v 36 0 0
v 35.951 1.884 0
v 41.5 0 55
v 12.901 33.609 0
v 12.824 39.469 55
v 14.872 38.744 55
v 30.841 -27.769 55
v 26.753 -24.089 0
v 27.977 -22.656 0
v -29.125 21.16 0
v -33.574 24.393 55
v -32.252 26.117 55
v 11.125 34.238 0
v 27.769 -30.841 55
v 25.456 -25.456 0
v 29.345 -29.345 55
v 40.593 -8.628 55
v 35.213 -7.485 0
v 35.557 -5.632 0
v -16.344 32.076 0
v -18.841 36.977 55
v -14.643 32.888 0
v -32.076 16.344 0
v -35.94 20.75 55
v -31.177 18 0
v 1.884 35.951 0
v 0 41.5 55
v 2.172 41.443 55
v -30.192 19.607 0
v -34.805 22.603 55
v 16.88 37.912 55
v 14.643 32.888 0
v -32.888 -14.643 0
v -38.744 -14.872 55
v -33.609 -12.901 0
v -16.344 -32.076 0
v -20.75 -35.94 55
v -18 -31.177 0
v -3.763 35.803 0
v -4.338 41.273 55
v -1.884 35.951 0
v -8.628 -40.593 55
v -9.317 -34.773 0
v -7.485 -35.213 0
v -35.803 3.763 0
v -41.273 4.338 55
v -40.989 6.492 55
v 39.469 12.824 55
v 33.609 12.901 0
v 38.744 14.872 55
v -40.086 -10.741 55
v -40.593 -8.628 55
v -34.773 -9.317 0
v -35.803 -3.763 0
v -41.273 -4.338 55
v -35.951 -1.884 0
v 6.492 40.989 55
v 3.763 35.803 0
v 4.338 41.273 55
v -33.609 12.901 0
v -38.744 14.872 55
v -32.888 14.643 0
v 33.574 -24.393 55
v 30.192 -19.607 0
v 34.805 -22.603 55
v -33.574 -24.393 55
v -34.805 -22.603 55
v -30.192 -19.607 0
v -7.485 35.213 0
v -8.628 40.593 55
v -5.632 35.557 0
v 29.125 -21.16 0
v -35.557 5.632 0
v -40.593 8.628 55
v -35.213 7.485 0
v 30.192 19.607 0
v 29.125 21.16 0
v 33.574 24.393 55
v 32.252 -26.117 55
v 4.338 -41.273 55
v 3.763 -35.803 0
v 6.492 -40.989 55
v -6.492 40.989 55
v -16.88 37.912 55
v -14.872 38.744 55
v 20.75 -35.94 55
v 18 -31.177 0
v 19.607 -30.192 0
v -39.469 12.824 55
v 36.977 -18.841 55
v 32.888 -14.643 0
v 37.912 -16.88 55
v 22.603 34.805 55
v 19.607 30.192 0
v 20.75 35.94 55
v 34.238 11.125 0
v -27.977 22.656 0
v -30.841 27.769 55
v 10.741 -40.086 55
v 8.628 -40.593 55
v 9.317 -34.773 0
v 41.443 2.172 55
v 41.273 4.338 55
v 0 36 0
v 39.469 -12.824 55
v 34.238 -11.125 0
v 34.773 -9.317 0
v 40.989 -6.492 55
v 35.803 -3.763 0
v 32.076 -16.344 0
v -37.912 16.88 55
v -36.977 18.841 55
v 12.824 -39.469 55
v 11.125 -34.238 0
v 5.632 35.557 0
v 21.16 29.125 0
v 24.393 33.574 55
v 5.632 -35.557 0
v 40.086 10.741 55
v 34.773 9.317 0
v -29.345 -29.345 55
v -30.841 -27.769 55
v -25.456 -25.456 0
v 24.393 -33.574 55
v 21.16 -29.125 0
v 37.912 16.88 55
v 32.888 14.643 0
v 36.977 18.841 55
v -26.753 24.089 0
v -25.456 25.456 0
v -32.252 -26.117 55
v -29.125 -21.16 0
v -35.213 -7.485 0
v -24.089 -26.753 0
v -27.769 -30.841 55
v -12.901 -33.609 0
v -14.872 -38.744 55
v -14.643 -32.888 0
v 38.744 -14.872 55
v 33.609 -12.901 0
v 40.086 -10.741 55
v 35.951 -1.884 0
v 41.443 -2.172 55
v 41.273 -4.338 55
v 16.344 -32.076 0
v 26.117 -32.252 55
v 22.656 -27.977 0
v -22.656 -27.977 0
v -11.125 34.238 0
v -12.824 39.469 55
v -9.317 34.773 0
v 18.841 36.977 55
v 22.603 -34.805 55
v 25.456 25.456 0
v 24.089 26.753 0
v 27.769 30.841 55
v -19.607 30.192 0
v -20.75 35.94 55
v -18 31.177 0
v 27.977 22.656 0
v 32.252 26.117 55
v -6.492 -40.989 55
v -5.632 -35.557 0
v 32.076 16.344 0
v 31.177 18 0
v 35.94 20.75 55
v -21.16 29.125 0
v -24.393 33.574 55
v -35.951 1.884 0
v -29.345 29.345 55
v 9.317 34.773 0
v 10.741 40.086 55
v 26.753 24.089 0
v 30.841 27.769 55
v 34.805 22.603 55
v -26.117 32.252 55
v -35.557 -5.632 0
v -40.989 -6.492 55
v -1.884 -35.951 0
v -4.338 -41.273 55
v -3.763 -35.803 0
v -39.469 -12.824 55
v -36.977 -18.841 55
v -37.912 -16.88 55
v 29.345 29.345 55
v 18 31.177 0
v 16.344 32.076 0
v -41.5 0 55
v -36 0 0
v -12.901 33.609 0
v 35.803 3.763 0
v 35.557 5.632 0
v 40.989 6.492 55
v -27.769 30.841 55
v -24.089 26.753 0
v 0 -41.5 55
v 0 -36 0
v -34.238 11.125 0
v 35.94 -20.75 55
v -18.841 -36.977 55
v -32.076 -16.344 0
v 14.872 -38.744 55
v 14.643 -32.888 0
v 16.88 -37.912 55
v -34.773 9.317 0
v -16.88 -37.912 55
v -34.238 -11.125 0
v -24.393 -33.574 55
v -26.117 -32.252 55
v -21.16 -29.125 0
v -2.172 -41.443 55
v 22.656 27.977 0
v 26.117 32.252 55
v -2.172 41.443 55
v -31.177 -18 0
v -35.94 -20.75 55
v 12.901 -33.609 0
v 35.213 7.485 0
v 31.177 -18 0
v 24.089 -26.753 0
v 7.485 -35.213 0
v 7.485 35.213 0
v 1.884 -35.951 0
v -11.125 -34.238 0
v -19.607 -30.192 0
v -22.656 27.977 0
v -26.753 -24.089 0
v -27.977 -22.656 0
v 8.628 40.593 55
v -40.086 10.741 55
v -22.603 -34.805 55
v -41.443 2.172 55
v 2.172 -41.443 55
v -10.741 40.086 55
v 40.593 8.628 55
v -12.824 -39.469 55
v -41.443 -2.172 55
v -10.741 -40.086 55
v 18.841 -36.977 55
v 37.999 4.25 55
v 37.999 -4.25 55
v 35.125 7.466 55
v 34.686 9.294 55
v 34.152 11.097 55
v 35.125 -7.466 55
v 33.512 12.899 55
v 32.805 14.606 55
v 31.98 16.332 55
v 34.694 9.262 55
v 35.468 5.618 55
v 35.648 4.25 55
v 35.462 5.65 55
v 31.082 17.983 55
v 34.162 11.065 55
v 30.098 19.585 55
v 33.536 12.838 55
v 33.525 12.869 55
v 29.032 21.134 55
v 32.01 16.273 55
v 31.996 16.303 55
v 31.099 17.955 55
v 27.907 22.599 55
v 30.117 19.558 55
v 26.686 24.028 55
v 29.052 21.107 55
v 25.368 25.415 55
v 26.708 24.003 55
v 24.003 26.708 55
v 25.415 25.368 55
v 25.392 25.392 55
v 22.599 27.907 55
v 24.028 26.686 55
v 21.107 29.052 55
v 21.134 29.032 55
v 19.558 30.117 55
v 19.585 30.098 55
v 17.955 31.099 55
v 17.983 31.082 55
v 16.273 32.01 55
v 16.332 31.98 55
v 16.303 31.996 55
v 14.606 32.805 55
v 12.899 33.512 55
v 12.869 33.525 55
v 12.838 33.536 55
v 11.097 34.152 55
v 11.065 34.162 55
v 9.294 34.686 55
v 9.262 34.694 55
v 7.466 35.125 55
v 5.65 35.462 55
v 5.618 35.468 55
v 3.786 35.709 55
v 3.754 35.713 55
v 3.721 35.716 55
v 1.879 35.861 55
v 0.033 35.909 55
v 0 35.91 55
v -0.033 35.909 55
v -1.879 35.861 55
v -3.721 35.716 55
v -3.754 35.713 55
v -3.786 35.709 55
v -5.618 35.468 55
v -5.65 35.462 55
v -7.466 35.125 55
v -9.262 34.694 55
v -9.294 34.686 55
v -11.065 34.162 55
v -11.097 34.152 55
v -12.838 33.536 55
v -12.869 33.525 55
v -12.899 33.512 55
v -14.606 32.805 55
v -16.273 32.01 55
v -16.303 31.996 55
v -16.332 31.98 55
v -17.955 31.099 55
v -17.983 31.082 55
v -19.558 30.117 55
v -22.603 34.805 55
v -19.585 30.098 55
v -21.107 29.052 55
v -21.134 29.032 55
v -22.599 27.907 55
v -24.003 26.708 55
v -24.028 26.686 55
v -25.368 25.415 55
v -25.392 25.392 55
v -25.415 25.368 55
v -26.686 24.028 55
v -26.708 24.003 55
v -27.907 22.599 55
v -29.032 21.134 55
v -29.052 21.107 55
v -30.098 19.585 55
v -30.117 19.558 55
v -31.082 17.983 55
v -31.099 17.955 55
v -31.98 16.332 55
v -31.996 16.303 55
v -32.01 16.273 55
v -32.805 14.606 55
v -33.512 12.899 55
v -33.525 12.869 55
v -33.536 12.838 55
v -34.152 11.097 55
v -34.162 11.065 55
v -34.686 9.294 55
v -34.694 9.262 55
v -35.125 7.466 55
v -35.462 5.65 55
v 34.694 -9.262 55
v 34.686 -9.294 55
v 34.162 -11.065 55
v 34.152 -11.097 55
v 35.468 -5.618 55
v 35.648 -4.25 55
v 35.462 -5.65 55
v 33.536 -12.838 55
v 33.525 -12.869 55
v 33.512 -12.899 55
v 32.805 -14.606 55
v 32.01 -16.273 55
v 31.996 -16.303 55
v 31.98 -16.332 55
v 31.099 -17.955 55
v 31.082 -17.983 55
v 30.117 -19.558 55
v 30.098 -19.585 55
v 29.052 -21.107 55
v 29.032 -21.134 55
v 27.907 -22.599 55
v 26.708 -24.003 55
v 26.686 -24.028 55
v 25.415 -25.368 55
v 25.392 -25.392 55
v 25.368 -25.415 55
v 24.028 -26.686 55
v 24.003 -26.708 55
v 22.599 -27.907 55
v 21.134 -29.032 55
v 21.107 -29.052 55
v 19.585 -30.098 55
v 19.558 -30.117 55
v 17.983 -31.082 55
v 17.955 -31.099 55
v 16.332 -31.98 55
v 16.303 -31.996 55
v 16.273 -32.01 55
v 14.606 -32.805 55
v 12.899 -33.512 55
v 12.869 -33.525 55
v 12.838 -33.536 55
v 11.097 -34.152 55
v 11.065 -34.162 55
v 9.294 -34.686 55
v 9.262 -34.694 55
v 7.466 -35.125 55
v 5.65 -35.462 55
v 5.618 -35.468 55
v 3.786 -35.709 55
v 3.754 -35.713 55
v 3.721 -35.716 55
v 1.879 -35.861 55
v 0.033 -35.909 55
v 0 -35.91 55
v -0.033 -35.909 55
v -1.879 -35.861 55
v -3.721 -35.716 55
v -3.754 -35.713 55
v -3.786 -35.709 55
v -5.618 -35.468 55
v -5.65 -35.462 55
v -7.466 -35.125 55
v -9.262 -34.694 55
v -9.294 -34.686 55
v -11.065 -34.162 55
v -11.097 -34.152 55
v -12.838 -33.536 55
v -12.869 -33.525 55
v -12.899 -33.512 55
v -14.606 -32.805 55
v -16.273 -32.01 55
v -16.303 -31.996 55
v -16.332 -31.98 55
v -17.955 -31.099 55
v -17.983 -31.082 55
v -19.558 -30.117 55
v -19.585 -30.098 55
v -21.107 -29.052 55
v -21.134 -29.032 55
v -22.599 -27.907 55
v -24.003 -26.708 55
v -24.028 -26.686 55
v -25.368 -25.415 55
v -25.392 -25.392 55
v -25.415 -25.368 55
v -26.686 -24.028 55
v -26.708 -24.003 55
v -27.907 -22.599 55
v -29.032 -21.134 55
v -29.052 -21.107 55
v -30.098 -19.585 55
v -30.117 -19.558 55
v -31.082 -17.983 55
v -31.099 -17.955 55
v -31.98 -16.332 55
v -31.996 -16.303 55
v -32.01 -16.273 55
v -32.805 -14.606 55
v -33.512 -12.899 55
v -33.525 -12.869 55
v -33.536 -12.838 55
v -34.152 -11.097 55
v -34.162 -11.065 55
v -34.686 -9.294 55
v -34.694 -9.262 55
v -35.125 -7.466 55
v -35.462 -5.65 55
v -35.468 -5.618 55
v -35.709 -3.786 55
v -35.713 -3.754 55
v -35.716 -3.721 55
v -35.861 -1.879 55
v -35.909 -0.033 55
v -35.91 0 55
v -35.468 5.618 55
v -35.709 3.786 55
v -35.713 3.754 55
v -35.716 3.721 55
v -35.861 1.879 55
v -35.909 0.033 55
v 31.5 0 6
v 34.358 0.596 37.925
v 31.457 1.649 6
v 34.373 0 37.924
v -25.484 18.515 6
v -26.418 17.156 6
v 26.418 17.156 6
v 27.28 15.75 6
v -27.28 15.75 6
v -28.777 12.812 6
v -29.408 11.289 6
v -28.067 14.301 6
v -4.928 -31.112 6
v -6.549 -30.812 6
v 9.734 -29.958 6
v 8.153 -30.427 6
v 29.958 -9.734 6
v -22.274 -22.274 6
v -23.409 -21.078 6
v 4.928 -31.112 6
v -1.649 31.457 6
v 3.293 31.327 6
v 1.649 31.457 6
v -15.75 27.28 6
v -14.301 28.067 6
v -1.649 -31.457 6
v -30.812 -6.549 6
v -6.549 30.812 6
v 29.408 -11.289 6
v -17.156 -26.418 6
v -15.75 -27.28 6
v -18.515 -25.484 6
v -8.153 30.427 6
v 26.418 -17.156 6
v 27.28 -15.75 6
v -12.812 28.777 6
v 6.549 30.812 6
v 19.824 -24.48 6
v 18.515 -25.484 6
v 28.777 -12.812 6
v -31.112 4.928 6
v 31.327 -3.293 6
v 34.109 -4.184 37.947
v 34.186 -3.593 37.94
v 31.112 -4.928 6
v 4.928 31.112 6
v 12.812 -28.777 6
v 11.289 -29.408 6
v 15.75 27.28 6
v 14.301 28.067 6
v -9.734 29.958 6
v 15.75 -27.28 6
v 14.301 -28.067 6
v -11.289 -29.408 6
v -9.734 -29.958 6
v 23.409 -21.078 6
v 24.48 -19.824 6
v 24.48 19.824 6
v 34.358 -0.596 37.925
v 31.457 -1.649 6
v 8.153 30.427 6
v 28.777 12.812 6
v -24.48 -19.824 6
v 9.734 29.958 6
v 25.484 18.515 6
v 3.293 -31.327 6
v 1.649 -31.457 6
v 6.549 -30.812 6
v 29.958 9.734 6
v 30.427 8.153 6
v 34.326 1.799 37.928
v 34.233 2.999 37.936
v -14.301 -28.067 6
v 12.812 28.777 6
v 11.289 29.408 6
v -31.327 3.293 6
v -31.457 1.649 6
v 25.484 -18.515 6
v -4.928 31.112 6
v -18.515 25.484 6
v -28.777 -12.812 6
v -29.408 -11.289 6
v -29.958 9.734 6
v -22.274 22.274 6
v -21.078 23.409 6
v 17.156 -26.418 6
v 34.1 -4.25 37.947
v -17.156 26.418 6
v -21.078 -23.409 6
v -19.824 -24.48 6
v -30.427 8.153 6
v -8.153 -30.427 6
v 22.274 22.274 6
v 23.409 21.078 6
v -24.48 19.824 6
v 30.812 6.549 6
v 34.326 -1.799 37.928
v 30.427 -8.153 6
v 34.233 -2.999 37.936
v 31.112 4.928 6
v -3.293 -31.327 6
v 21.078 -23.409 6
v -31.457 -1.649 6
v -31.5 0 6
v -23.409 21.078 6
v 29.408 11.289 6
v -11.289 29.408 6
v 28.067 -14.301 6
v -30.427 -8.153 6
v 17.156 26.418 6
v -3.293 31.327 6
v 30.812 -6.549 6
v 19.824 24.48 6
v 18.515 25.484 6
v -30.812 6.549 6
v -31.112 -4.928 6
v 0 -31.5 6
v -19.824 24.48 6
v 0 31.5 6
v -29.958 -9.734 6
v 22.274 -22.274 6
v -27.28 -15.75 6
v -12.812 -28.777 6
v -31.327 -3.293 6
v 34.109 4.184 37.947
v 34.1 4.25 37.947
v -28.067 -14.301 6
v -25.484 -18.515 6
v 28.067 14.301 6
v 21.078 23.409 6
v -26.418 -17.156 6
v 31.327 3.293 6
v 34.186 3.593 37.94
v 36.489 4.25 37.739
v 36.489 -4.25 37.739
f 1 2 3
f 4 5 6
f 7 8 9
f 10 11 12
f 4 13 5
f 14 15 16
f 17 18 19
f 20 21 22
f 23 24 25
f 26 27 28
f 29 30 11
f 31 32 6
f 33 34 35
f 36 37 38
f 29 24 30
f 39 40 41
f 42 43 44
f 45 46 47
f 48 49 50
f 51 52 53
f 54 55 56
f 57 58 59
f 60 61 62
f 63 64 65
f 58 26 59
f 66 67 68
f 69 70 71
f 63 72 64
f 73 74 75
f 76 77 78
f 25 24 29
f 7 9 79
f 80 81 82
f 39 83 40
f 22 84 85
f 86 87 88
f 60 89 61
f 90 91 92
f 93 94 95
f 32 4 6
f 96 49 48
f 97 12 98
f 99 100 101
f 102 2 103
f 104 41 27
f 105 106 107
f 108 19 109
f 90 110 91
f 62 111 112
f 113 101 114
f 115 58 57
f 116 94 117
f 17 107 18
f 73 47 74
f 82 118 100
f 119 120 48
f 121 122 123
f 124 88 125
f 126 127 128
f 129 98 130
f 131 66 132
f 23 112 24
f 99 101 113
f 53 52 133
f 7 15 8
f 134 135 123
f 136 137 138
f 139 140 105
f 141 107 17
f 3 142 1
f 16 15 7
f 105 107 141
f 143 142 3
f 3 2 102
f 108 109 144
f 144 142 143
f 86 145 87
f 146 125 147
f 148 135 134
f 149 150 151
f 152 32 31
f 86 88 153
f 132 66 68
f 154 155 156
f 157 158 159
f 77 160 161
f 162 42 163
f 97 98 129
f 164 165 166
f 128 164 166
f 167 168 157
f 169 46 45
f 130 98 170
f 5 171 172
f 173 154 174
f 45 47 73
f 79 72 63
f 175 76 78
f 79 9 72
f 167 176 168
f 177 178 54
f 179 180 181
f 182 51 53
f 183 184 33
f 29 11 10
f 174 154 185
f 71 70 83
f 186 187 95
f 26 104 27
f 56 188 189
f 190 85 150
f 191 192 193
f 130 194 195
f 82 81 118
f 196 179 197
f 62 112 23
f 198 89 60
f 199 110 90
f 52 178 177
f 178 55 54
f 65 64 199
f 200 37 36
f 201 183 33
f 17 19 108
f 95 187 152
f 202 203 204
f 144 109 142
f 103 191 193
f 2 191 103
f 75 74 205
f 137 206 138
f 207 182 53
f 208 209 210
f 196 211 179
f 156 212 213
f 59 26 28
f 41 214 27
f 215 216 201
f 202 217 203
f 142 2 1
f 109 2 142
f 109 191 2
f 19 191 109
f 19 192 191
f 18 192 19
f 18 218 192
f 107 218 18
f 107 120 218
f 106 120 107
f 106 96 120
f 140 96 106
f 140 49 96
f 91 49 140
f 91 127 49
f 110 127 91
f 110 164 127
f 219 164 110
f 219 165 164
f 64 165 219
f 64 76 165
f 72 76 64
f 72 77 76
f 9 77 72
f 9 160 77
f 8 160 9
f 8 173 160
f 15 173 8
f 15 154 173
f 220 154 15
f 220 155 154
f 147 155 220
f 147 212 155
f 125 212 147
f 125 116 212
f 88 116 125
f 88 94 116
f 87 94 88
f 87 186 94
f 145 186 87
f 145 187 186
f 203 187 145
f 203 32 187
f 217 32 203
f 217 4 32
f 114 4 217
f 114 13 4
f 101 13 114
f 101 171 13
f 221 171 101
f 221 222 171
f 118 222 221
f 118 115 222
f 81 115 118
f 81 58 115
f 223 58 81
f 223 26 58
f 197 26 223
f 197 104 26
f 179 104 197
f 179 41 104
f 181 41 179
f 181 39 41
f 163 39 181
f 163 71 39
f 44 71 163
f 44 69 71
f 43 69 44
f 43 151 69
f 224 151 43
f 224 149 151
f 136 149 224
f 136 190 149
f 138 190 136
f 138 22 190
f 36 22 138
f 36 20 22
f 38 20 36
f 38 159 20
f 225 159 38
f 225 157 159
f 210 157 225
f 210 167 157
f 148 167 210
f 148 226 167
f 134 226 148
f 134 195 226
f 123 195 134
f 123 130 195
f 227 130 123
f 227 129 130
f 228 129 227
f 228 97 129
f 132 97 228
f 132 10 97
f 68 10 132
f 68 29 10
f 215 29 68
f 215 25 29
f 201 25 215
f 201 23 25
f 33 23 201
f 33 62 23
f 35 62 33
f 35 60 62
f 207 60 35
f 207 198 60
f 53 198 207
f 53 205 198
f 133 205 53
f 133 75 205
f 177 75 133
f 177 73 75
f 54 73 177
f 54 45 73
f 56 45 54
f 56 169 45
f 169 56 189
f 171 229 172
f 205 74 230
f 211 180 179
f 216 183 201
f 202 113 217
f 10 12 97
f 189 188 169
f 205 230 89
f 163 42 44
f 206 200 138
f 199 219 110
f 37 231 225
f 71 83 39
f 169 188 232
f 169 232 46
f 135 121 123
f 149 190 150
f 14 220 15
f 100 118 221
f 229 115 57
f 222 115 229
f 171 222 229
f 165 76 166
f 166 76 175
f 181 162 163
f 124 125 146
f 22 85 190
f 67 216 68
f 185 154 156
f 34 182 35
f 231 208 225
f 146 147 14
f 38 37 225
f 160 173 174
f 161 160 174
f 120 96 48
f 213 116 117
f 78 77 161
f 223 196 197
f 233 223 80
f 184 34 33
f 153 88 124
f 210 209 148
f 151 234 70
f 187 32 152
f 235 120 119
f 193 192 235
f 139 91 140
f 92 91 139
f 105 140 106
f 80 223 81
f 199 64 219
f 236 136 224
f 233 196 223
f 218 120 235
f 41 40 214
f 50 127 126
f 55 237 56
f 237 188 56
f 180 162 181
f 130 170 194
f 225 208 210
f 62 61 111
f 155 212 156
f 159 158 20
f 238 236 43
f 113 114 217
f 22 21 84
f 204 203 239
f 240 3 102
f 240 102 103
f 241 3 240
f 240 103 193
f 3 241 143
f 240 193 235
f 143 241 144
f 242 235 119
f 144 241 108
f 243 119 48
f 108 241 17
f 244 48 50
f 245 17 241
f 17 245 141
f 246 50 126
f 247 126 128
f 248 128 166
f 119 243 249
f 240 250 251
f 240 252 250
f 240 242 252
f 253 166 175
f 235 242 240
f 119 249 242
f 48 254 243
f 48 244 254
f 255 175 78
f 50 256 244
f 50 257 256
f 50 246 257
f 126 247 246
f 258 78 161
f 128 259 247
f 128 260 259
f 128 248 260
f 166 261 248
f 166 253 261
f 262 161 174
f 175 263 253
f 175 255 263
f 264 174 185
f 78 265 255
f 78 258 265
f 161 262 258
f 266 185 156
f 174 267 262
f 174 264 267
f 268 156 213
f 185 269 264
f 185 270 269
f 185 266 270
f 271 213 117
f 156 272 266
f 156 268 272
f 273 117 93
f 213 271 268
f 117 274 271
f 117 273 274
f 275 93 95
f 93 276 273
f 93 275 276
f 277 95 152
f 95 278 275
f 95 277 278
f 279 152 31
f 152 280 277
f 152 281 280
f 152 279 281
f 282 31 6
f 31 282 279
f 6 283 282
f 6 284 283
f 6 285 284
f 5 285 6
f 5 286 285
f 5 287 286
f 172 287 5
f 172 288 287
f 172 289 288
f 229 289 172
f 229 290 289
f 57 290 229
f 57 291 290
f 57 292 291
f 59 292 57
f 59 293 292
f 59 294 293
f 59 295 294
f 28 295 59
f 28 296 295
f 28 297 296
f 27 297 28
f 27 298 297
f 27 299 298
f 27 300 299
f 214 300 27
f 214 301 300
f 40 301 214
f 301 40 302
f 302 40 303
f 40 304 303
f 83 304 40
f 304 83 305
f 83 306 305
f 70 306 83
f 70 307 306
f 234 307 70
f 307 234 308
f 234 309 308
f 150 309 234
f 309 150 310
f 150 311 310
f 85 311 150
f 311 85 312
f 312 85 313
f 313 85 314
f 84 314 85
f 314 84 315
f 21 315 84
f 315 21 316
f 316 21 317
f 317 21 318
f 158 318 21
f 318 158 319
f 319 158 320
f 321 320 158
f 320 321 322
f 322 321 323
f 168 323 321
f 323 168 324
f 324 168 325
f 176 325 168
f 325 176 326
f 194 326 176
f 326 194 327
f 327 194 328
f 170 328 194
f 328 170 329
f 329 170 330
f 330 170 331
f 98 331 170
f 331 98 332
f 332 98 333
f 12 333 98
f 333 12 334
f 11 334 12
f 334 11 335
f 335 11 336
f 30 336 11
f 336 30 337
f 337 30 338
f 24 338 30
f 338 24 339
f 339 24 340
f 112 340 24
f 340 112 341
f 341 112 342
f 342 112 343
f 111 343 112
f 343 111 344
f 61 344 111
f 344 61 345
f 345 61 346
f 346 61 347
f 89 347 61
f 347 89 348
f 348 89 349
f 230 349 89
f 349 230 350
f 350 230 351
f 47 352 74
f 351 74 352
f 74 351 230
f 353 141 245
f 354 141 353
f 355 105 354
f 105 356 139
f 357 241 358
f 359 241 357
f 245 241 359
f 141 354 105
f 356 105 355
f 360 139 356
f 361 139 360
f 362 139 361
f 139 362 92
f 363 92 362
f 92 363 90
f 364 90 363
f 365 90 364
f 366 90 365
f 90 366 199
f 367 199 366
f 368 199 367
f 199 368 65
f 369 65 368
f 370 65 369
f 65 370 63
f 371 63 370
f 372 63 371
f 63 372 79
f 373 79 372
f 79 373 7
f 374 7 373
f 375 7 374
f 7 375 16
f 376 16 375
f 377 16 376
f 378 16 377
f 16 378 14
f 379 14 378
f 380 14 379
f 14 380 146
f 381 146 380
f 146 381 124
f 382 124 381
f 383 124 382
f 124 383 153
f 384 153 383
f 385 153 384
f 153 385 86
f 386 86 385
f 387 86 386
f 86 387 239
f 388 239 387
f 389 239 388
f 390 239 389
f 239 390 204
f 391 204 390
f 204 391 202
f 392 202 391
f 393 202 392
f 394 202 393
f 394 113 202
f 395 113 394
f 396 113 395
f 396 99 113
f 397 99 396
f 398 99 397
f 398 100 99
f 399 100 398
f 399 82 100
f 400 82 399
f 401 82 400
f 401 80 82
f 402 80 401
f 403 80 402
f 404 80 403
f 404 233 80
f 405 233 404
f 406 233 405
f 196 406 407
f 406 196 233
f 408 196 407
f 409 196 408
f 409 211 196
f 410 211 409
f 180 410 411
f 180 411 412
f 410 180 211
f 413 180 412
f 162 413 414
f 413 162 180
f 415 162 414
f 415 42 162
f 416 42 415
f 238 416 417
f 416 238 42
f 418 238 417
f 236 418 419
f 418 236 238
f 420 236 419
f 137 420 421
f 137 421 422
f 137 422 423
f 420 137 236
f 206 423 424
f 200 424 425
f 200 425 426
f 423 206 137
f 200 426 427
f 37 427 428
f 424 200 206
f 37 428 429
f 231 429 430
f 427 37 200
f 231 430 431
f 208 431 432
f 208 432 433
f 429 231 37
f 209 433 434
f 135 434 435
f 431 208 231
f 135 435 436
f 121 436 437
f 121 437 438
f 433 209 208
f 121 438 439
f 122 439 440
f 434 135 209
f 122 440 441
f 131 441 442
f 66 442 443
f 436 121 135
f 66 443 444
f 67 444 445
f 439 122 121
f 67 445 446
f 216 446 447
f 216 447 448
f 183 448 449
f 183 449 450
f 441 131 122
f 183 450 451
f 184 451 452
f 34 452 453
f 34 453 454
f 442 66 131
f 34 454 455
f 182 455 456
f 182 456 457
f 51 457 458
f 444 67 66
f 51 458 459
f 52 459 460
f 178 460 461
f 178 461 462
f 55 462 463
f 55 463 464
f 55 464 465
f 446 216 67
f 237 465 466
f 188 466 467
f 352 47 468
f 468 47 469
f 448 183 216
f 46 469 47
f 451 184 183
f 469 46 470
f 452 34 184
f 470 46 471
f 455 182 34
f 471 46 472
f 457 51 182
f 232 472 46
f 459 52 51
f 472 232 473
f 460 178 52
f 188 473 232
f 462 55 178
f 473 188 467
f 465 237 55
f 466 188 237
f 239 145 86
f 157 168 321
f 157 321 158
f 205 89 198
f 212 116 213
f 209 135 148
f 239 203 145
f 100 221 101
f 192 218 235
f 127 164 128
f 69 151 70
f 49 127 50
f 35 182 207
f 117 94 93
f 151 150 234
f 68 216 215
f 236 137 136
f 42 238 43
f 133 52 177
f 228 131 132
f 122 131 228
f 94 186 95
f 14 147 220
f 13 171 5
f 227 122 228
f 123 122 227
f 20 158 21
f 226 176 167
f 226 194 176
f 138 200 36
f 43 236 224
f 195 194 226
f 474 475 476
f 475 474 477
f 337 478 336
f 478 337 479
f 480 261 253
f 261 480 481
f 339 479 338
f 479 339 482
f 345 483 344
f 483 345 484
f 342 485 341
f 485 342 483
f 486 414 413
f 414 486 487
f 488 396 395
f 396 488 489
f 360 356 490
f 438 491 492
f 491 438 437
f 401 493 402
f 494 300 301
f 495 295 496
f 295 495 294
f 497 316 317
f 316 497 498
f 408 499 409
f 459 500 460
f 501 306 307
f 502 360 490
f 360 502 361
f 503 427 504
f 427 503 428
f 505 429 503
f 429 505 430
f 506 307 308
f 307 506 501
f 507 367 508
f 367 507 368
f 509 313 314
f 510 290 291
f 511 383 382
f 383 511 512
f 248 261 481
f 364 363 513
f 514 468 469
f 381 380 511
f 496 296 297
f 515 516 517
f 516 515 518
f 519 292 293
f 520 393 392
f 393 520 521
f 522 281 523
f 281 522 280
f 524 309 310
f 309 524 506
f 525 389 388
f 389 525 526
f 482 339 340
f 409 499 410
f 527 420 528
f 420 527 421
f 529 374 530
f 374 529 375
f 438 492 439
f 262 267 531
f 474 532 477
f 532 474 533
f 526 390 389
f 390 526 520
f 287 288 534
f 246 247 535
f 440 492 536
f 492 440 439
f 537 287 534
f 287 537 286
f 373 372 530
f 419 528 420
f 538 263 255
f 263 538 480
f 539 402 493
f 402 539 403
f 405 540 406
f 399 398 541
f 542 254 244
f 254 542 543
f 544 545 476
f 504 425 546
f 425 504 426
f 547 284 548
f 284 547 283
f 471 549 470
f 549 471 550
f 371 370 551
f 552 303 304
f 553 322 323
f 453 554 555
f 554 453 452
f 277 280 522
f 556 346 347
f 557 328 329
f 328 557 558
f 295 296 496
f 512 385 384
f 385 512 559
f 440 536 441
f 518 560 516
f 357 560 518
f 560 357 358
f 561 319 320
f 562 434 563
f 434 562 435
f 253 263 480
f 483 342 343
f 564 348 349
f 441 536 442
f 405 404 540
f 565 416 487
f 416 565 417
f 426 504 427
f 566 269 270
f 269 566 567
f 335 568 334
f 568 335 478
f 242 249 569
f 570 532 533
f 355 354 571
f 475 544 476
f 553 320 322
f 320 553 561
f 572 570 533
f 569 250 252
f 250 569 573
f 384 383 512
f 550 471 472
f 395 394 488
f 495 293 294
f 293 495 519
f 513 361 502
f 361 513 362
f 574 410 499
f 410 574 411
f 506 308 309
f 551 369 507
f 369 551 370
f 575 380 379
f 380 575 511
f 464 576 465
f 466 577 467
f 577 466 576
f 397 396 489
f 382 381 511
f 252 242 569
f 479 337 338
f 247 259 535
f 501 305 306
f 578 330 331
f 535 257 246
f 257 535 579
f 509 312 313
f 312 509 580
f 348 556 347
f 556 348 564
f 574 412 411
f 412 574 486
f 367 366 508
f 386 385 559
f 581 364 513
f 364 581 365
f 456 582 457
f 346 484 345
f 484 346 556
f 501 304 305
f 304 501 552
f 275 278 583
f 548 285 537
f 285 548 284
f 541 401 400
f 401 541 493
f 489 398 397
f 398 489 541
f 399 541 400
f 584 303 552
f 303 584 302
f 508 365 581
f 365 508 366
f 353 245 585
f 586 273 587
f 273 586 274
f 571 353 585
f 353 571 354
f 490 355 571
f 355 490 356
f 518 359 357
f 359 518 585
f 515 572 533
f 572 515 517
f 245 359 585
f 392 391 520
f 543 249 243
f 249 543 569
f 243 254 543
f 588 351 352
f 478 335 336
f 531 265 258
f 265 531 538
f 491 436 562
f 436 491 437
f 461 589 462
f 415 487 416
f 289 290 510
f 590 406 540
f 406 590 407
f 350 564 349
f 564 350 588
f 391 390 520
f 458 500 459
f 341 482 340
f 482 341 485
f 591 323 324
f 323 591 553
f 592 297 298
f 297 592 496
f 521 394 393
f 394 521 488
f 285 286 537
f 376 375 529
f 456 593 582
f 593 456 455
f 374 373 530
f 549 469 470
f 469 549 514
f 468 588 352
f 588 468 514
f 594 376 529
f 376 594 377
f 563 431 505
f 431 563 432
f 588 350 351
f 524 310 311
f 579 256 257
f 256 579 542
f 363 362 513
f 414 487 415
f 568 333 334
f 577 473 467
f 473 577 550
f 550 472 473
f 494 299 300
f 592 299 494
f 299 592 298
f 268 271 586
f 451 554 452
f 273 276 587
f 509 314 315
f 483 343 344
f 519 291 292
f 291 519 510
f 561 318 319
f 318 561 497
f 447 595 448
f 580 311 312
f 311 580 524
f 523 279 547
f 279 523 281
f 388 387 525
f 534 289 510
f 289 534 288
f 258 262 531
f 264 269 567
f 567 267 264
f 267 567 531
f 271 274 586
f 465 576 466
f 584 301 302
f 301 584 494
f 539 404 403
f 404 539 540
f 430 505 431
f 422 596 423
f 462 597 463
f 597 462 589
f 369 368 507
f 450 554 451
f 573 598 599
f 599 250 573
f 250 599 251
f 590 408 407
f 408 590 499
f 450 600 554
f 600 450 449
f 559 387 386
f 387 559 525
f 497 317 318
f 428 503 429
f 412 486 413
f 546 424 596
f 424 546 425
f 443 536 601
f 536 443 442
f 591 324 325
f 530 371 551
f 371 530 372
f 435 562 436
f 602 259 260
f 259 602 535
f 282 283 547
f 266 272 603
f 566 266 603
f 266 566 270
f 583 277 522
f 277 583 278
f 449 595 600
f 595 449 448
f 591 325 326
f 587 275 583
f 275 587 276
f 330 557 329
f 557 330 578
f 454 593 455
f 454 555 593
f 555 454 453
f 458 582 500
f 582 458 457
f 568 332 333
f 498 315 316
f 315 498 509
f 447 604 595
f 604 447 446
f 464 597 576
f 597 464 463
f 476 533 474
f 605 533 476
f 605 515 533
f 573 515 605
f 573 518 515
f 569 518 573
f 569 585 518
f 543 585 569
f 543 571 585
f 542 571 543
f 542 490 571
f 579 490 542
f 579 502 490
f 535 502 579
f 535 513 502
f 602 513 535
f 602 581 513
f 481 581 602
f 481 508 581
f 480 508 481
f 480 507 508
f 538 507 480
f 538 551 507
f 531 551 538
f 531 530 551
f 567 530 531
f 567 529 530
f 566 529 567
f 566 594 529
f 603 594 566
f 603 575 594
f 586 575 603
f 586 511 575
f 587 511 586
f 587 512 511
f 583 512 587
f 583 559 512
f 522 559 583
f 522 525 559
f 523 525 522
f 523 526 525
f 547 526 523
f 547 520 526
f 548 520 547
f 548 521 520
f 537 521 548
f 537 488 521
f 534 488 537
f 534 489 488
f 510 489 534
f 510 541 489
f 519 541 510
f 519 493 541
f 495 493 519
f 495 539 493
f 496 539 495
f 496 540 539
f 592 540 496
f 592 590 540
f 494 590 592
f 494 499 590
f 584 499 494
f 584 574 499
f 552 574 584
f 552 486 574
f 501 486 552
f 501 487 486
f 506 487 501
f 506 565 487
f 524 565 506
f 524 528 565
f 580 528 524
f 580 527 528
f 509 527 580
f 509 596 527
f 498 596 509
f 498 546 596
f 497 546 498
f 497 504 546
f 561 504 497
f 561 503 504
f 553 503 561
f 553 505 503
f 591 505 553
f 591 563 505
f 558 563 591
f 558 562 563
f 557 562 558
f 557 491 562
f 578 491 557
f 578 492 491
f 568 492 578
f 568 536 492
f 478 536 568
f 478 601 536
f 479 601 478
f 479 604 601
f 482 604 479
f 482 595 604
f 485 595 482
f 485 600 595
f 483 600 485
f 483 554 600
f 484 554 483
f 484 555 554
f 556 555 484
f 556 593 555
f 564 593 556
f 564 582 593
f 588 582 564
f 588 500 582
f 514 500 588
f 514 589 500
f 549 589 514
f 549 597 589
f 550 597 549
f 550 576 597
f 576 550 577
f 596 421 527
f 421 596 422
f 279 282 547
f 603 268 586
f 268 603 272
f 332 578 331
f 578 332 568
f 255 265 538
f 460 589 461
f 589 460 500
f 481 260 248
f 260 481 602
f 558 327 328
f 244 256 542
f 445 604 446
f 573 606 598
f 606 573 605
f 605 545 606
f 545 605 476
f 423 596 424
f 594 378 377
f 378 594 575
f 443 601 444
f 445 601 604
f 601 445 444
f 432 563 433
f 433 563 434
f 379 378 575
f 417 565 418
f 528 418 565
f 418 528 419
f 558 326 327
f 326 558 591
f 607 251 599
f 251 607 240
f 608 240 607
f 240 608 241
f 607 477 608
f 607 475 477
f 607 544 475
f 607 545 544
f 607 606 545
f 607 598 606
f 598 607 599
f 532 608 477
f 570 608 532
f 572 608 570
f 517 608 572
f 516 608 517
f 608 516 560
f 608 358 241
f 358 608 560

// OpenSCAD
$fn=120;
difference() {
    cylinder(h=55, d1=72, d2=83);  // outer solid
    translate([0,0,6]) cylinder(h=50, d1=63, d2=72);  // inner cup
    translate([33.5,-4.25,38]) rotate([0,5.0,0]) cube([3, 8.5, 24.5]);
    }
